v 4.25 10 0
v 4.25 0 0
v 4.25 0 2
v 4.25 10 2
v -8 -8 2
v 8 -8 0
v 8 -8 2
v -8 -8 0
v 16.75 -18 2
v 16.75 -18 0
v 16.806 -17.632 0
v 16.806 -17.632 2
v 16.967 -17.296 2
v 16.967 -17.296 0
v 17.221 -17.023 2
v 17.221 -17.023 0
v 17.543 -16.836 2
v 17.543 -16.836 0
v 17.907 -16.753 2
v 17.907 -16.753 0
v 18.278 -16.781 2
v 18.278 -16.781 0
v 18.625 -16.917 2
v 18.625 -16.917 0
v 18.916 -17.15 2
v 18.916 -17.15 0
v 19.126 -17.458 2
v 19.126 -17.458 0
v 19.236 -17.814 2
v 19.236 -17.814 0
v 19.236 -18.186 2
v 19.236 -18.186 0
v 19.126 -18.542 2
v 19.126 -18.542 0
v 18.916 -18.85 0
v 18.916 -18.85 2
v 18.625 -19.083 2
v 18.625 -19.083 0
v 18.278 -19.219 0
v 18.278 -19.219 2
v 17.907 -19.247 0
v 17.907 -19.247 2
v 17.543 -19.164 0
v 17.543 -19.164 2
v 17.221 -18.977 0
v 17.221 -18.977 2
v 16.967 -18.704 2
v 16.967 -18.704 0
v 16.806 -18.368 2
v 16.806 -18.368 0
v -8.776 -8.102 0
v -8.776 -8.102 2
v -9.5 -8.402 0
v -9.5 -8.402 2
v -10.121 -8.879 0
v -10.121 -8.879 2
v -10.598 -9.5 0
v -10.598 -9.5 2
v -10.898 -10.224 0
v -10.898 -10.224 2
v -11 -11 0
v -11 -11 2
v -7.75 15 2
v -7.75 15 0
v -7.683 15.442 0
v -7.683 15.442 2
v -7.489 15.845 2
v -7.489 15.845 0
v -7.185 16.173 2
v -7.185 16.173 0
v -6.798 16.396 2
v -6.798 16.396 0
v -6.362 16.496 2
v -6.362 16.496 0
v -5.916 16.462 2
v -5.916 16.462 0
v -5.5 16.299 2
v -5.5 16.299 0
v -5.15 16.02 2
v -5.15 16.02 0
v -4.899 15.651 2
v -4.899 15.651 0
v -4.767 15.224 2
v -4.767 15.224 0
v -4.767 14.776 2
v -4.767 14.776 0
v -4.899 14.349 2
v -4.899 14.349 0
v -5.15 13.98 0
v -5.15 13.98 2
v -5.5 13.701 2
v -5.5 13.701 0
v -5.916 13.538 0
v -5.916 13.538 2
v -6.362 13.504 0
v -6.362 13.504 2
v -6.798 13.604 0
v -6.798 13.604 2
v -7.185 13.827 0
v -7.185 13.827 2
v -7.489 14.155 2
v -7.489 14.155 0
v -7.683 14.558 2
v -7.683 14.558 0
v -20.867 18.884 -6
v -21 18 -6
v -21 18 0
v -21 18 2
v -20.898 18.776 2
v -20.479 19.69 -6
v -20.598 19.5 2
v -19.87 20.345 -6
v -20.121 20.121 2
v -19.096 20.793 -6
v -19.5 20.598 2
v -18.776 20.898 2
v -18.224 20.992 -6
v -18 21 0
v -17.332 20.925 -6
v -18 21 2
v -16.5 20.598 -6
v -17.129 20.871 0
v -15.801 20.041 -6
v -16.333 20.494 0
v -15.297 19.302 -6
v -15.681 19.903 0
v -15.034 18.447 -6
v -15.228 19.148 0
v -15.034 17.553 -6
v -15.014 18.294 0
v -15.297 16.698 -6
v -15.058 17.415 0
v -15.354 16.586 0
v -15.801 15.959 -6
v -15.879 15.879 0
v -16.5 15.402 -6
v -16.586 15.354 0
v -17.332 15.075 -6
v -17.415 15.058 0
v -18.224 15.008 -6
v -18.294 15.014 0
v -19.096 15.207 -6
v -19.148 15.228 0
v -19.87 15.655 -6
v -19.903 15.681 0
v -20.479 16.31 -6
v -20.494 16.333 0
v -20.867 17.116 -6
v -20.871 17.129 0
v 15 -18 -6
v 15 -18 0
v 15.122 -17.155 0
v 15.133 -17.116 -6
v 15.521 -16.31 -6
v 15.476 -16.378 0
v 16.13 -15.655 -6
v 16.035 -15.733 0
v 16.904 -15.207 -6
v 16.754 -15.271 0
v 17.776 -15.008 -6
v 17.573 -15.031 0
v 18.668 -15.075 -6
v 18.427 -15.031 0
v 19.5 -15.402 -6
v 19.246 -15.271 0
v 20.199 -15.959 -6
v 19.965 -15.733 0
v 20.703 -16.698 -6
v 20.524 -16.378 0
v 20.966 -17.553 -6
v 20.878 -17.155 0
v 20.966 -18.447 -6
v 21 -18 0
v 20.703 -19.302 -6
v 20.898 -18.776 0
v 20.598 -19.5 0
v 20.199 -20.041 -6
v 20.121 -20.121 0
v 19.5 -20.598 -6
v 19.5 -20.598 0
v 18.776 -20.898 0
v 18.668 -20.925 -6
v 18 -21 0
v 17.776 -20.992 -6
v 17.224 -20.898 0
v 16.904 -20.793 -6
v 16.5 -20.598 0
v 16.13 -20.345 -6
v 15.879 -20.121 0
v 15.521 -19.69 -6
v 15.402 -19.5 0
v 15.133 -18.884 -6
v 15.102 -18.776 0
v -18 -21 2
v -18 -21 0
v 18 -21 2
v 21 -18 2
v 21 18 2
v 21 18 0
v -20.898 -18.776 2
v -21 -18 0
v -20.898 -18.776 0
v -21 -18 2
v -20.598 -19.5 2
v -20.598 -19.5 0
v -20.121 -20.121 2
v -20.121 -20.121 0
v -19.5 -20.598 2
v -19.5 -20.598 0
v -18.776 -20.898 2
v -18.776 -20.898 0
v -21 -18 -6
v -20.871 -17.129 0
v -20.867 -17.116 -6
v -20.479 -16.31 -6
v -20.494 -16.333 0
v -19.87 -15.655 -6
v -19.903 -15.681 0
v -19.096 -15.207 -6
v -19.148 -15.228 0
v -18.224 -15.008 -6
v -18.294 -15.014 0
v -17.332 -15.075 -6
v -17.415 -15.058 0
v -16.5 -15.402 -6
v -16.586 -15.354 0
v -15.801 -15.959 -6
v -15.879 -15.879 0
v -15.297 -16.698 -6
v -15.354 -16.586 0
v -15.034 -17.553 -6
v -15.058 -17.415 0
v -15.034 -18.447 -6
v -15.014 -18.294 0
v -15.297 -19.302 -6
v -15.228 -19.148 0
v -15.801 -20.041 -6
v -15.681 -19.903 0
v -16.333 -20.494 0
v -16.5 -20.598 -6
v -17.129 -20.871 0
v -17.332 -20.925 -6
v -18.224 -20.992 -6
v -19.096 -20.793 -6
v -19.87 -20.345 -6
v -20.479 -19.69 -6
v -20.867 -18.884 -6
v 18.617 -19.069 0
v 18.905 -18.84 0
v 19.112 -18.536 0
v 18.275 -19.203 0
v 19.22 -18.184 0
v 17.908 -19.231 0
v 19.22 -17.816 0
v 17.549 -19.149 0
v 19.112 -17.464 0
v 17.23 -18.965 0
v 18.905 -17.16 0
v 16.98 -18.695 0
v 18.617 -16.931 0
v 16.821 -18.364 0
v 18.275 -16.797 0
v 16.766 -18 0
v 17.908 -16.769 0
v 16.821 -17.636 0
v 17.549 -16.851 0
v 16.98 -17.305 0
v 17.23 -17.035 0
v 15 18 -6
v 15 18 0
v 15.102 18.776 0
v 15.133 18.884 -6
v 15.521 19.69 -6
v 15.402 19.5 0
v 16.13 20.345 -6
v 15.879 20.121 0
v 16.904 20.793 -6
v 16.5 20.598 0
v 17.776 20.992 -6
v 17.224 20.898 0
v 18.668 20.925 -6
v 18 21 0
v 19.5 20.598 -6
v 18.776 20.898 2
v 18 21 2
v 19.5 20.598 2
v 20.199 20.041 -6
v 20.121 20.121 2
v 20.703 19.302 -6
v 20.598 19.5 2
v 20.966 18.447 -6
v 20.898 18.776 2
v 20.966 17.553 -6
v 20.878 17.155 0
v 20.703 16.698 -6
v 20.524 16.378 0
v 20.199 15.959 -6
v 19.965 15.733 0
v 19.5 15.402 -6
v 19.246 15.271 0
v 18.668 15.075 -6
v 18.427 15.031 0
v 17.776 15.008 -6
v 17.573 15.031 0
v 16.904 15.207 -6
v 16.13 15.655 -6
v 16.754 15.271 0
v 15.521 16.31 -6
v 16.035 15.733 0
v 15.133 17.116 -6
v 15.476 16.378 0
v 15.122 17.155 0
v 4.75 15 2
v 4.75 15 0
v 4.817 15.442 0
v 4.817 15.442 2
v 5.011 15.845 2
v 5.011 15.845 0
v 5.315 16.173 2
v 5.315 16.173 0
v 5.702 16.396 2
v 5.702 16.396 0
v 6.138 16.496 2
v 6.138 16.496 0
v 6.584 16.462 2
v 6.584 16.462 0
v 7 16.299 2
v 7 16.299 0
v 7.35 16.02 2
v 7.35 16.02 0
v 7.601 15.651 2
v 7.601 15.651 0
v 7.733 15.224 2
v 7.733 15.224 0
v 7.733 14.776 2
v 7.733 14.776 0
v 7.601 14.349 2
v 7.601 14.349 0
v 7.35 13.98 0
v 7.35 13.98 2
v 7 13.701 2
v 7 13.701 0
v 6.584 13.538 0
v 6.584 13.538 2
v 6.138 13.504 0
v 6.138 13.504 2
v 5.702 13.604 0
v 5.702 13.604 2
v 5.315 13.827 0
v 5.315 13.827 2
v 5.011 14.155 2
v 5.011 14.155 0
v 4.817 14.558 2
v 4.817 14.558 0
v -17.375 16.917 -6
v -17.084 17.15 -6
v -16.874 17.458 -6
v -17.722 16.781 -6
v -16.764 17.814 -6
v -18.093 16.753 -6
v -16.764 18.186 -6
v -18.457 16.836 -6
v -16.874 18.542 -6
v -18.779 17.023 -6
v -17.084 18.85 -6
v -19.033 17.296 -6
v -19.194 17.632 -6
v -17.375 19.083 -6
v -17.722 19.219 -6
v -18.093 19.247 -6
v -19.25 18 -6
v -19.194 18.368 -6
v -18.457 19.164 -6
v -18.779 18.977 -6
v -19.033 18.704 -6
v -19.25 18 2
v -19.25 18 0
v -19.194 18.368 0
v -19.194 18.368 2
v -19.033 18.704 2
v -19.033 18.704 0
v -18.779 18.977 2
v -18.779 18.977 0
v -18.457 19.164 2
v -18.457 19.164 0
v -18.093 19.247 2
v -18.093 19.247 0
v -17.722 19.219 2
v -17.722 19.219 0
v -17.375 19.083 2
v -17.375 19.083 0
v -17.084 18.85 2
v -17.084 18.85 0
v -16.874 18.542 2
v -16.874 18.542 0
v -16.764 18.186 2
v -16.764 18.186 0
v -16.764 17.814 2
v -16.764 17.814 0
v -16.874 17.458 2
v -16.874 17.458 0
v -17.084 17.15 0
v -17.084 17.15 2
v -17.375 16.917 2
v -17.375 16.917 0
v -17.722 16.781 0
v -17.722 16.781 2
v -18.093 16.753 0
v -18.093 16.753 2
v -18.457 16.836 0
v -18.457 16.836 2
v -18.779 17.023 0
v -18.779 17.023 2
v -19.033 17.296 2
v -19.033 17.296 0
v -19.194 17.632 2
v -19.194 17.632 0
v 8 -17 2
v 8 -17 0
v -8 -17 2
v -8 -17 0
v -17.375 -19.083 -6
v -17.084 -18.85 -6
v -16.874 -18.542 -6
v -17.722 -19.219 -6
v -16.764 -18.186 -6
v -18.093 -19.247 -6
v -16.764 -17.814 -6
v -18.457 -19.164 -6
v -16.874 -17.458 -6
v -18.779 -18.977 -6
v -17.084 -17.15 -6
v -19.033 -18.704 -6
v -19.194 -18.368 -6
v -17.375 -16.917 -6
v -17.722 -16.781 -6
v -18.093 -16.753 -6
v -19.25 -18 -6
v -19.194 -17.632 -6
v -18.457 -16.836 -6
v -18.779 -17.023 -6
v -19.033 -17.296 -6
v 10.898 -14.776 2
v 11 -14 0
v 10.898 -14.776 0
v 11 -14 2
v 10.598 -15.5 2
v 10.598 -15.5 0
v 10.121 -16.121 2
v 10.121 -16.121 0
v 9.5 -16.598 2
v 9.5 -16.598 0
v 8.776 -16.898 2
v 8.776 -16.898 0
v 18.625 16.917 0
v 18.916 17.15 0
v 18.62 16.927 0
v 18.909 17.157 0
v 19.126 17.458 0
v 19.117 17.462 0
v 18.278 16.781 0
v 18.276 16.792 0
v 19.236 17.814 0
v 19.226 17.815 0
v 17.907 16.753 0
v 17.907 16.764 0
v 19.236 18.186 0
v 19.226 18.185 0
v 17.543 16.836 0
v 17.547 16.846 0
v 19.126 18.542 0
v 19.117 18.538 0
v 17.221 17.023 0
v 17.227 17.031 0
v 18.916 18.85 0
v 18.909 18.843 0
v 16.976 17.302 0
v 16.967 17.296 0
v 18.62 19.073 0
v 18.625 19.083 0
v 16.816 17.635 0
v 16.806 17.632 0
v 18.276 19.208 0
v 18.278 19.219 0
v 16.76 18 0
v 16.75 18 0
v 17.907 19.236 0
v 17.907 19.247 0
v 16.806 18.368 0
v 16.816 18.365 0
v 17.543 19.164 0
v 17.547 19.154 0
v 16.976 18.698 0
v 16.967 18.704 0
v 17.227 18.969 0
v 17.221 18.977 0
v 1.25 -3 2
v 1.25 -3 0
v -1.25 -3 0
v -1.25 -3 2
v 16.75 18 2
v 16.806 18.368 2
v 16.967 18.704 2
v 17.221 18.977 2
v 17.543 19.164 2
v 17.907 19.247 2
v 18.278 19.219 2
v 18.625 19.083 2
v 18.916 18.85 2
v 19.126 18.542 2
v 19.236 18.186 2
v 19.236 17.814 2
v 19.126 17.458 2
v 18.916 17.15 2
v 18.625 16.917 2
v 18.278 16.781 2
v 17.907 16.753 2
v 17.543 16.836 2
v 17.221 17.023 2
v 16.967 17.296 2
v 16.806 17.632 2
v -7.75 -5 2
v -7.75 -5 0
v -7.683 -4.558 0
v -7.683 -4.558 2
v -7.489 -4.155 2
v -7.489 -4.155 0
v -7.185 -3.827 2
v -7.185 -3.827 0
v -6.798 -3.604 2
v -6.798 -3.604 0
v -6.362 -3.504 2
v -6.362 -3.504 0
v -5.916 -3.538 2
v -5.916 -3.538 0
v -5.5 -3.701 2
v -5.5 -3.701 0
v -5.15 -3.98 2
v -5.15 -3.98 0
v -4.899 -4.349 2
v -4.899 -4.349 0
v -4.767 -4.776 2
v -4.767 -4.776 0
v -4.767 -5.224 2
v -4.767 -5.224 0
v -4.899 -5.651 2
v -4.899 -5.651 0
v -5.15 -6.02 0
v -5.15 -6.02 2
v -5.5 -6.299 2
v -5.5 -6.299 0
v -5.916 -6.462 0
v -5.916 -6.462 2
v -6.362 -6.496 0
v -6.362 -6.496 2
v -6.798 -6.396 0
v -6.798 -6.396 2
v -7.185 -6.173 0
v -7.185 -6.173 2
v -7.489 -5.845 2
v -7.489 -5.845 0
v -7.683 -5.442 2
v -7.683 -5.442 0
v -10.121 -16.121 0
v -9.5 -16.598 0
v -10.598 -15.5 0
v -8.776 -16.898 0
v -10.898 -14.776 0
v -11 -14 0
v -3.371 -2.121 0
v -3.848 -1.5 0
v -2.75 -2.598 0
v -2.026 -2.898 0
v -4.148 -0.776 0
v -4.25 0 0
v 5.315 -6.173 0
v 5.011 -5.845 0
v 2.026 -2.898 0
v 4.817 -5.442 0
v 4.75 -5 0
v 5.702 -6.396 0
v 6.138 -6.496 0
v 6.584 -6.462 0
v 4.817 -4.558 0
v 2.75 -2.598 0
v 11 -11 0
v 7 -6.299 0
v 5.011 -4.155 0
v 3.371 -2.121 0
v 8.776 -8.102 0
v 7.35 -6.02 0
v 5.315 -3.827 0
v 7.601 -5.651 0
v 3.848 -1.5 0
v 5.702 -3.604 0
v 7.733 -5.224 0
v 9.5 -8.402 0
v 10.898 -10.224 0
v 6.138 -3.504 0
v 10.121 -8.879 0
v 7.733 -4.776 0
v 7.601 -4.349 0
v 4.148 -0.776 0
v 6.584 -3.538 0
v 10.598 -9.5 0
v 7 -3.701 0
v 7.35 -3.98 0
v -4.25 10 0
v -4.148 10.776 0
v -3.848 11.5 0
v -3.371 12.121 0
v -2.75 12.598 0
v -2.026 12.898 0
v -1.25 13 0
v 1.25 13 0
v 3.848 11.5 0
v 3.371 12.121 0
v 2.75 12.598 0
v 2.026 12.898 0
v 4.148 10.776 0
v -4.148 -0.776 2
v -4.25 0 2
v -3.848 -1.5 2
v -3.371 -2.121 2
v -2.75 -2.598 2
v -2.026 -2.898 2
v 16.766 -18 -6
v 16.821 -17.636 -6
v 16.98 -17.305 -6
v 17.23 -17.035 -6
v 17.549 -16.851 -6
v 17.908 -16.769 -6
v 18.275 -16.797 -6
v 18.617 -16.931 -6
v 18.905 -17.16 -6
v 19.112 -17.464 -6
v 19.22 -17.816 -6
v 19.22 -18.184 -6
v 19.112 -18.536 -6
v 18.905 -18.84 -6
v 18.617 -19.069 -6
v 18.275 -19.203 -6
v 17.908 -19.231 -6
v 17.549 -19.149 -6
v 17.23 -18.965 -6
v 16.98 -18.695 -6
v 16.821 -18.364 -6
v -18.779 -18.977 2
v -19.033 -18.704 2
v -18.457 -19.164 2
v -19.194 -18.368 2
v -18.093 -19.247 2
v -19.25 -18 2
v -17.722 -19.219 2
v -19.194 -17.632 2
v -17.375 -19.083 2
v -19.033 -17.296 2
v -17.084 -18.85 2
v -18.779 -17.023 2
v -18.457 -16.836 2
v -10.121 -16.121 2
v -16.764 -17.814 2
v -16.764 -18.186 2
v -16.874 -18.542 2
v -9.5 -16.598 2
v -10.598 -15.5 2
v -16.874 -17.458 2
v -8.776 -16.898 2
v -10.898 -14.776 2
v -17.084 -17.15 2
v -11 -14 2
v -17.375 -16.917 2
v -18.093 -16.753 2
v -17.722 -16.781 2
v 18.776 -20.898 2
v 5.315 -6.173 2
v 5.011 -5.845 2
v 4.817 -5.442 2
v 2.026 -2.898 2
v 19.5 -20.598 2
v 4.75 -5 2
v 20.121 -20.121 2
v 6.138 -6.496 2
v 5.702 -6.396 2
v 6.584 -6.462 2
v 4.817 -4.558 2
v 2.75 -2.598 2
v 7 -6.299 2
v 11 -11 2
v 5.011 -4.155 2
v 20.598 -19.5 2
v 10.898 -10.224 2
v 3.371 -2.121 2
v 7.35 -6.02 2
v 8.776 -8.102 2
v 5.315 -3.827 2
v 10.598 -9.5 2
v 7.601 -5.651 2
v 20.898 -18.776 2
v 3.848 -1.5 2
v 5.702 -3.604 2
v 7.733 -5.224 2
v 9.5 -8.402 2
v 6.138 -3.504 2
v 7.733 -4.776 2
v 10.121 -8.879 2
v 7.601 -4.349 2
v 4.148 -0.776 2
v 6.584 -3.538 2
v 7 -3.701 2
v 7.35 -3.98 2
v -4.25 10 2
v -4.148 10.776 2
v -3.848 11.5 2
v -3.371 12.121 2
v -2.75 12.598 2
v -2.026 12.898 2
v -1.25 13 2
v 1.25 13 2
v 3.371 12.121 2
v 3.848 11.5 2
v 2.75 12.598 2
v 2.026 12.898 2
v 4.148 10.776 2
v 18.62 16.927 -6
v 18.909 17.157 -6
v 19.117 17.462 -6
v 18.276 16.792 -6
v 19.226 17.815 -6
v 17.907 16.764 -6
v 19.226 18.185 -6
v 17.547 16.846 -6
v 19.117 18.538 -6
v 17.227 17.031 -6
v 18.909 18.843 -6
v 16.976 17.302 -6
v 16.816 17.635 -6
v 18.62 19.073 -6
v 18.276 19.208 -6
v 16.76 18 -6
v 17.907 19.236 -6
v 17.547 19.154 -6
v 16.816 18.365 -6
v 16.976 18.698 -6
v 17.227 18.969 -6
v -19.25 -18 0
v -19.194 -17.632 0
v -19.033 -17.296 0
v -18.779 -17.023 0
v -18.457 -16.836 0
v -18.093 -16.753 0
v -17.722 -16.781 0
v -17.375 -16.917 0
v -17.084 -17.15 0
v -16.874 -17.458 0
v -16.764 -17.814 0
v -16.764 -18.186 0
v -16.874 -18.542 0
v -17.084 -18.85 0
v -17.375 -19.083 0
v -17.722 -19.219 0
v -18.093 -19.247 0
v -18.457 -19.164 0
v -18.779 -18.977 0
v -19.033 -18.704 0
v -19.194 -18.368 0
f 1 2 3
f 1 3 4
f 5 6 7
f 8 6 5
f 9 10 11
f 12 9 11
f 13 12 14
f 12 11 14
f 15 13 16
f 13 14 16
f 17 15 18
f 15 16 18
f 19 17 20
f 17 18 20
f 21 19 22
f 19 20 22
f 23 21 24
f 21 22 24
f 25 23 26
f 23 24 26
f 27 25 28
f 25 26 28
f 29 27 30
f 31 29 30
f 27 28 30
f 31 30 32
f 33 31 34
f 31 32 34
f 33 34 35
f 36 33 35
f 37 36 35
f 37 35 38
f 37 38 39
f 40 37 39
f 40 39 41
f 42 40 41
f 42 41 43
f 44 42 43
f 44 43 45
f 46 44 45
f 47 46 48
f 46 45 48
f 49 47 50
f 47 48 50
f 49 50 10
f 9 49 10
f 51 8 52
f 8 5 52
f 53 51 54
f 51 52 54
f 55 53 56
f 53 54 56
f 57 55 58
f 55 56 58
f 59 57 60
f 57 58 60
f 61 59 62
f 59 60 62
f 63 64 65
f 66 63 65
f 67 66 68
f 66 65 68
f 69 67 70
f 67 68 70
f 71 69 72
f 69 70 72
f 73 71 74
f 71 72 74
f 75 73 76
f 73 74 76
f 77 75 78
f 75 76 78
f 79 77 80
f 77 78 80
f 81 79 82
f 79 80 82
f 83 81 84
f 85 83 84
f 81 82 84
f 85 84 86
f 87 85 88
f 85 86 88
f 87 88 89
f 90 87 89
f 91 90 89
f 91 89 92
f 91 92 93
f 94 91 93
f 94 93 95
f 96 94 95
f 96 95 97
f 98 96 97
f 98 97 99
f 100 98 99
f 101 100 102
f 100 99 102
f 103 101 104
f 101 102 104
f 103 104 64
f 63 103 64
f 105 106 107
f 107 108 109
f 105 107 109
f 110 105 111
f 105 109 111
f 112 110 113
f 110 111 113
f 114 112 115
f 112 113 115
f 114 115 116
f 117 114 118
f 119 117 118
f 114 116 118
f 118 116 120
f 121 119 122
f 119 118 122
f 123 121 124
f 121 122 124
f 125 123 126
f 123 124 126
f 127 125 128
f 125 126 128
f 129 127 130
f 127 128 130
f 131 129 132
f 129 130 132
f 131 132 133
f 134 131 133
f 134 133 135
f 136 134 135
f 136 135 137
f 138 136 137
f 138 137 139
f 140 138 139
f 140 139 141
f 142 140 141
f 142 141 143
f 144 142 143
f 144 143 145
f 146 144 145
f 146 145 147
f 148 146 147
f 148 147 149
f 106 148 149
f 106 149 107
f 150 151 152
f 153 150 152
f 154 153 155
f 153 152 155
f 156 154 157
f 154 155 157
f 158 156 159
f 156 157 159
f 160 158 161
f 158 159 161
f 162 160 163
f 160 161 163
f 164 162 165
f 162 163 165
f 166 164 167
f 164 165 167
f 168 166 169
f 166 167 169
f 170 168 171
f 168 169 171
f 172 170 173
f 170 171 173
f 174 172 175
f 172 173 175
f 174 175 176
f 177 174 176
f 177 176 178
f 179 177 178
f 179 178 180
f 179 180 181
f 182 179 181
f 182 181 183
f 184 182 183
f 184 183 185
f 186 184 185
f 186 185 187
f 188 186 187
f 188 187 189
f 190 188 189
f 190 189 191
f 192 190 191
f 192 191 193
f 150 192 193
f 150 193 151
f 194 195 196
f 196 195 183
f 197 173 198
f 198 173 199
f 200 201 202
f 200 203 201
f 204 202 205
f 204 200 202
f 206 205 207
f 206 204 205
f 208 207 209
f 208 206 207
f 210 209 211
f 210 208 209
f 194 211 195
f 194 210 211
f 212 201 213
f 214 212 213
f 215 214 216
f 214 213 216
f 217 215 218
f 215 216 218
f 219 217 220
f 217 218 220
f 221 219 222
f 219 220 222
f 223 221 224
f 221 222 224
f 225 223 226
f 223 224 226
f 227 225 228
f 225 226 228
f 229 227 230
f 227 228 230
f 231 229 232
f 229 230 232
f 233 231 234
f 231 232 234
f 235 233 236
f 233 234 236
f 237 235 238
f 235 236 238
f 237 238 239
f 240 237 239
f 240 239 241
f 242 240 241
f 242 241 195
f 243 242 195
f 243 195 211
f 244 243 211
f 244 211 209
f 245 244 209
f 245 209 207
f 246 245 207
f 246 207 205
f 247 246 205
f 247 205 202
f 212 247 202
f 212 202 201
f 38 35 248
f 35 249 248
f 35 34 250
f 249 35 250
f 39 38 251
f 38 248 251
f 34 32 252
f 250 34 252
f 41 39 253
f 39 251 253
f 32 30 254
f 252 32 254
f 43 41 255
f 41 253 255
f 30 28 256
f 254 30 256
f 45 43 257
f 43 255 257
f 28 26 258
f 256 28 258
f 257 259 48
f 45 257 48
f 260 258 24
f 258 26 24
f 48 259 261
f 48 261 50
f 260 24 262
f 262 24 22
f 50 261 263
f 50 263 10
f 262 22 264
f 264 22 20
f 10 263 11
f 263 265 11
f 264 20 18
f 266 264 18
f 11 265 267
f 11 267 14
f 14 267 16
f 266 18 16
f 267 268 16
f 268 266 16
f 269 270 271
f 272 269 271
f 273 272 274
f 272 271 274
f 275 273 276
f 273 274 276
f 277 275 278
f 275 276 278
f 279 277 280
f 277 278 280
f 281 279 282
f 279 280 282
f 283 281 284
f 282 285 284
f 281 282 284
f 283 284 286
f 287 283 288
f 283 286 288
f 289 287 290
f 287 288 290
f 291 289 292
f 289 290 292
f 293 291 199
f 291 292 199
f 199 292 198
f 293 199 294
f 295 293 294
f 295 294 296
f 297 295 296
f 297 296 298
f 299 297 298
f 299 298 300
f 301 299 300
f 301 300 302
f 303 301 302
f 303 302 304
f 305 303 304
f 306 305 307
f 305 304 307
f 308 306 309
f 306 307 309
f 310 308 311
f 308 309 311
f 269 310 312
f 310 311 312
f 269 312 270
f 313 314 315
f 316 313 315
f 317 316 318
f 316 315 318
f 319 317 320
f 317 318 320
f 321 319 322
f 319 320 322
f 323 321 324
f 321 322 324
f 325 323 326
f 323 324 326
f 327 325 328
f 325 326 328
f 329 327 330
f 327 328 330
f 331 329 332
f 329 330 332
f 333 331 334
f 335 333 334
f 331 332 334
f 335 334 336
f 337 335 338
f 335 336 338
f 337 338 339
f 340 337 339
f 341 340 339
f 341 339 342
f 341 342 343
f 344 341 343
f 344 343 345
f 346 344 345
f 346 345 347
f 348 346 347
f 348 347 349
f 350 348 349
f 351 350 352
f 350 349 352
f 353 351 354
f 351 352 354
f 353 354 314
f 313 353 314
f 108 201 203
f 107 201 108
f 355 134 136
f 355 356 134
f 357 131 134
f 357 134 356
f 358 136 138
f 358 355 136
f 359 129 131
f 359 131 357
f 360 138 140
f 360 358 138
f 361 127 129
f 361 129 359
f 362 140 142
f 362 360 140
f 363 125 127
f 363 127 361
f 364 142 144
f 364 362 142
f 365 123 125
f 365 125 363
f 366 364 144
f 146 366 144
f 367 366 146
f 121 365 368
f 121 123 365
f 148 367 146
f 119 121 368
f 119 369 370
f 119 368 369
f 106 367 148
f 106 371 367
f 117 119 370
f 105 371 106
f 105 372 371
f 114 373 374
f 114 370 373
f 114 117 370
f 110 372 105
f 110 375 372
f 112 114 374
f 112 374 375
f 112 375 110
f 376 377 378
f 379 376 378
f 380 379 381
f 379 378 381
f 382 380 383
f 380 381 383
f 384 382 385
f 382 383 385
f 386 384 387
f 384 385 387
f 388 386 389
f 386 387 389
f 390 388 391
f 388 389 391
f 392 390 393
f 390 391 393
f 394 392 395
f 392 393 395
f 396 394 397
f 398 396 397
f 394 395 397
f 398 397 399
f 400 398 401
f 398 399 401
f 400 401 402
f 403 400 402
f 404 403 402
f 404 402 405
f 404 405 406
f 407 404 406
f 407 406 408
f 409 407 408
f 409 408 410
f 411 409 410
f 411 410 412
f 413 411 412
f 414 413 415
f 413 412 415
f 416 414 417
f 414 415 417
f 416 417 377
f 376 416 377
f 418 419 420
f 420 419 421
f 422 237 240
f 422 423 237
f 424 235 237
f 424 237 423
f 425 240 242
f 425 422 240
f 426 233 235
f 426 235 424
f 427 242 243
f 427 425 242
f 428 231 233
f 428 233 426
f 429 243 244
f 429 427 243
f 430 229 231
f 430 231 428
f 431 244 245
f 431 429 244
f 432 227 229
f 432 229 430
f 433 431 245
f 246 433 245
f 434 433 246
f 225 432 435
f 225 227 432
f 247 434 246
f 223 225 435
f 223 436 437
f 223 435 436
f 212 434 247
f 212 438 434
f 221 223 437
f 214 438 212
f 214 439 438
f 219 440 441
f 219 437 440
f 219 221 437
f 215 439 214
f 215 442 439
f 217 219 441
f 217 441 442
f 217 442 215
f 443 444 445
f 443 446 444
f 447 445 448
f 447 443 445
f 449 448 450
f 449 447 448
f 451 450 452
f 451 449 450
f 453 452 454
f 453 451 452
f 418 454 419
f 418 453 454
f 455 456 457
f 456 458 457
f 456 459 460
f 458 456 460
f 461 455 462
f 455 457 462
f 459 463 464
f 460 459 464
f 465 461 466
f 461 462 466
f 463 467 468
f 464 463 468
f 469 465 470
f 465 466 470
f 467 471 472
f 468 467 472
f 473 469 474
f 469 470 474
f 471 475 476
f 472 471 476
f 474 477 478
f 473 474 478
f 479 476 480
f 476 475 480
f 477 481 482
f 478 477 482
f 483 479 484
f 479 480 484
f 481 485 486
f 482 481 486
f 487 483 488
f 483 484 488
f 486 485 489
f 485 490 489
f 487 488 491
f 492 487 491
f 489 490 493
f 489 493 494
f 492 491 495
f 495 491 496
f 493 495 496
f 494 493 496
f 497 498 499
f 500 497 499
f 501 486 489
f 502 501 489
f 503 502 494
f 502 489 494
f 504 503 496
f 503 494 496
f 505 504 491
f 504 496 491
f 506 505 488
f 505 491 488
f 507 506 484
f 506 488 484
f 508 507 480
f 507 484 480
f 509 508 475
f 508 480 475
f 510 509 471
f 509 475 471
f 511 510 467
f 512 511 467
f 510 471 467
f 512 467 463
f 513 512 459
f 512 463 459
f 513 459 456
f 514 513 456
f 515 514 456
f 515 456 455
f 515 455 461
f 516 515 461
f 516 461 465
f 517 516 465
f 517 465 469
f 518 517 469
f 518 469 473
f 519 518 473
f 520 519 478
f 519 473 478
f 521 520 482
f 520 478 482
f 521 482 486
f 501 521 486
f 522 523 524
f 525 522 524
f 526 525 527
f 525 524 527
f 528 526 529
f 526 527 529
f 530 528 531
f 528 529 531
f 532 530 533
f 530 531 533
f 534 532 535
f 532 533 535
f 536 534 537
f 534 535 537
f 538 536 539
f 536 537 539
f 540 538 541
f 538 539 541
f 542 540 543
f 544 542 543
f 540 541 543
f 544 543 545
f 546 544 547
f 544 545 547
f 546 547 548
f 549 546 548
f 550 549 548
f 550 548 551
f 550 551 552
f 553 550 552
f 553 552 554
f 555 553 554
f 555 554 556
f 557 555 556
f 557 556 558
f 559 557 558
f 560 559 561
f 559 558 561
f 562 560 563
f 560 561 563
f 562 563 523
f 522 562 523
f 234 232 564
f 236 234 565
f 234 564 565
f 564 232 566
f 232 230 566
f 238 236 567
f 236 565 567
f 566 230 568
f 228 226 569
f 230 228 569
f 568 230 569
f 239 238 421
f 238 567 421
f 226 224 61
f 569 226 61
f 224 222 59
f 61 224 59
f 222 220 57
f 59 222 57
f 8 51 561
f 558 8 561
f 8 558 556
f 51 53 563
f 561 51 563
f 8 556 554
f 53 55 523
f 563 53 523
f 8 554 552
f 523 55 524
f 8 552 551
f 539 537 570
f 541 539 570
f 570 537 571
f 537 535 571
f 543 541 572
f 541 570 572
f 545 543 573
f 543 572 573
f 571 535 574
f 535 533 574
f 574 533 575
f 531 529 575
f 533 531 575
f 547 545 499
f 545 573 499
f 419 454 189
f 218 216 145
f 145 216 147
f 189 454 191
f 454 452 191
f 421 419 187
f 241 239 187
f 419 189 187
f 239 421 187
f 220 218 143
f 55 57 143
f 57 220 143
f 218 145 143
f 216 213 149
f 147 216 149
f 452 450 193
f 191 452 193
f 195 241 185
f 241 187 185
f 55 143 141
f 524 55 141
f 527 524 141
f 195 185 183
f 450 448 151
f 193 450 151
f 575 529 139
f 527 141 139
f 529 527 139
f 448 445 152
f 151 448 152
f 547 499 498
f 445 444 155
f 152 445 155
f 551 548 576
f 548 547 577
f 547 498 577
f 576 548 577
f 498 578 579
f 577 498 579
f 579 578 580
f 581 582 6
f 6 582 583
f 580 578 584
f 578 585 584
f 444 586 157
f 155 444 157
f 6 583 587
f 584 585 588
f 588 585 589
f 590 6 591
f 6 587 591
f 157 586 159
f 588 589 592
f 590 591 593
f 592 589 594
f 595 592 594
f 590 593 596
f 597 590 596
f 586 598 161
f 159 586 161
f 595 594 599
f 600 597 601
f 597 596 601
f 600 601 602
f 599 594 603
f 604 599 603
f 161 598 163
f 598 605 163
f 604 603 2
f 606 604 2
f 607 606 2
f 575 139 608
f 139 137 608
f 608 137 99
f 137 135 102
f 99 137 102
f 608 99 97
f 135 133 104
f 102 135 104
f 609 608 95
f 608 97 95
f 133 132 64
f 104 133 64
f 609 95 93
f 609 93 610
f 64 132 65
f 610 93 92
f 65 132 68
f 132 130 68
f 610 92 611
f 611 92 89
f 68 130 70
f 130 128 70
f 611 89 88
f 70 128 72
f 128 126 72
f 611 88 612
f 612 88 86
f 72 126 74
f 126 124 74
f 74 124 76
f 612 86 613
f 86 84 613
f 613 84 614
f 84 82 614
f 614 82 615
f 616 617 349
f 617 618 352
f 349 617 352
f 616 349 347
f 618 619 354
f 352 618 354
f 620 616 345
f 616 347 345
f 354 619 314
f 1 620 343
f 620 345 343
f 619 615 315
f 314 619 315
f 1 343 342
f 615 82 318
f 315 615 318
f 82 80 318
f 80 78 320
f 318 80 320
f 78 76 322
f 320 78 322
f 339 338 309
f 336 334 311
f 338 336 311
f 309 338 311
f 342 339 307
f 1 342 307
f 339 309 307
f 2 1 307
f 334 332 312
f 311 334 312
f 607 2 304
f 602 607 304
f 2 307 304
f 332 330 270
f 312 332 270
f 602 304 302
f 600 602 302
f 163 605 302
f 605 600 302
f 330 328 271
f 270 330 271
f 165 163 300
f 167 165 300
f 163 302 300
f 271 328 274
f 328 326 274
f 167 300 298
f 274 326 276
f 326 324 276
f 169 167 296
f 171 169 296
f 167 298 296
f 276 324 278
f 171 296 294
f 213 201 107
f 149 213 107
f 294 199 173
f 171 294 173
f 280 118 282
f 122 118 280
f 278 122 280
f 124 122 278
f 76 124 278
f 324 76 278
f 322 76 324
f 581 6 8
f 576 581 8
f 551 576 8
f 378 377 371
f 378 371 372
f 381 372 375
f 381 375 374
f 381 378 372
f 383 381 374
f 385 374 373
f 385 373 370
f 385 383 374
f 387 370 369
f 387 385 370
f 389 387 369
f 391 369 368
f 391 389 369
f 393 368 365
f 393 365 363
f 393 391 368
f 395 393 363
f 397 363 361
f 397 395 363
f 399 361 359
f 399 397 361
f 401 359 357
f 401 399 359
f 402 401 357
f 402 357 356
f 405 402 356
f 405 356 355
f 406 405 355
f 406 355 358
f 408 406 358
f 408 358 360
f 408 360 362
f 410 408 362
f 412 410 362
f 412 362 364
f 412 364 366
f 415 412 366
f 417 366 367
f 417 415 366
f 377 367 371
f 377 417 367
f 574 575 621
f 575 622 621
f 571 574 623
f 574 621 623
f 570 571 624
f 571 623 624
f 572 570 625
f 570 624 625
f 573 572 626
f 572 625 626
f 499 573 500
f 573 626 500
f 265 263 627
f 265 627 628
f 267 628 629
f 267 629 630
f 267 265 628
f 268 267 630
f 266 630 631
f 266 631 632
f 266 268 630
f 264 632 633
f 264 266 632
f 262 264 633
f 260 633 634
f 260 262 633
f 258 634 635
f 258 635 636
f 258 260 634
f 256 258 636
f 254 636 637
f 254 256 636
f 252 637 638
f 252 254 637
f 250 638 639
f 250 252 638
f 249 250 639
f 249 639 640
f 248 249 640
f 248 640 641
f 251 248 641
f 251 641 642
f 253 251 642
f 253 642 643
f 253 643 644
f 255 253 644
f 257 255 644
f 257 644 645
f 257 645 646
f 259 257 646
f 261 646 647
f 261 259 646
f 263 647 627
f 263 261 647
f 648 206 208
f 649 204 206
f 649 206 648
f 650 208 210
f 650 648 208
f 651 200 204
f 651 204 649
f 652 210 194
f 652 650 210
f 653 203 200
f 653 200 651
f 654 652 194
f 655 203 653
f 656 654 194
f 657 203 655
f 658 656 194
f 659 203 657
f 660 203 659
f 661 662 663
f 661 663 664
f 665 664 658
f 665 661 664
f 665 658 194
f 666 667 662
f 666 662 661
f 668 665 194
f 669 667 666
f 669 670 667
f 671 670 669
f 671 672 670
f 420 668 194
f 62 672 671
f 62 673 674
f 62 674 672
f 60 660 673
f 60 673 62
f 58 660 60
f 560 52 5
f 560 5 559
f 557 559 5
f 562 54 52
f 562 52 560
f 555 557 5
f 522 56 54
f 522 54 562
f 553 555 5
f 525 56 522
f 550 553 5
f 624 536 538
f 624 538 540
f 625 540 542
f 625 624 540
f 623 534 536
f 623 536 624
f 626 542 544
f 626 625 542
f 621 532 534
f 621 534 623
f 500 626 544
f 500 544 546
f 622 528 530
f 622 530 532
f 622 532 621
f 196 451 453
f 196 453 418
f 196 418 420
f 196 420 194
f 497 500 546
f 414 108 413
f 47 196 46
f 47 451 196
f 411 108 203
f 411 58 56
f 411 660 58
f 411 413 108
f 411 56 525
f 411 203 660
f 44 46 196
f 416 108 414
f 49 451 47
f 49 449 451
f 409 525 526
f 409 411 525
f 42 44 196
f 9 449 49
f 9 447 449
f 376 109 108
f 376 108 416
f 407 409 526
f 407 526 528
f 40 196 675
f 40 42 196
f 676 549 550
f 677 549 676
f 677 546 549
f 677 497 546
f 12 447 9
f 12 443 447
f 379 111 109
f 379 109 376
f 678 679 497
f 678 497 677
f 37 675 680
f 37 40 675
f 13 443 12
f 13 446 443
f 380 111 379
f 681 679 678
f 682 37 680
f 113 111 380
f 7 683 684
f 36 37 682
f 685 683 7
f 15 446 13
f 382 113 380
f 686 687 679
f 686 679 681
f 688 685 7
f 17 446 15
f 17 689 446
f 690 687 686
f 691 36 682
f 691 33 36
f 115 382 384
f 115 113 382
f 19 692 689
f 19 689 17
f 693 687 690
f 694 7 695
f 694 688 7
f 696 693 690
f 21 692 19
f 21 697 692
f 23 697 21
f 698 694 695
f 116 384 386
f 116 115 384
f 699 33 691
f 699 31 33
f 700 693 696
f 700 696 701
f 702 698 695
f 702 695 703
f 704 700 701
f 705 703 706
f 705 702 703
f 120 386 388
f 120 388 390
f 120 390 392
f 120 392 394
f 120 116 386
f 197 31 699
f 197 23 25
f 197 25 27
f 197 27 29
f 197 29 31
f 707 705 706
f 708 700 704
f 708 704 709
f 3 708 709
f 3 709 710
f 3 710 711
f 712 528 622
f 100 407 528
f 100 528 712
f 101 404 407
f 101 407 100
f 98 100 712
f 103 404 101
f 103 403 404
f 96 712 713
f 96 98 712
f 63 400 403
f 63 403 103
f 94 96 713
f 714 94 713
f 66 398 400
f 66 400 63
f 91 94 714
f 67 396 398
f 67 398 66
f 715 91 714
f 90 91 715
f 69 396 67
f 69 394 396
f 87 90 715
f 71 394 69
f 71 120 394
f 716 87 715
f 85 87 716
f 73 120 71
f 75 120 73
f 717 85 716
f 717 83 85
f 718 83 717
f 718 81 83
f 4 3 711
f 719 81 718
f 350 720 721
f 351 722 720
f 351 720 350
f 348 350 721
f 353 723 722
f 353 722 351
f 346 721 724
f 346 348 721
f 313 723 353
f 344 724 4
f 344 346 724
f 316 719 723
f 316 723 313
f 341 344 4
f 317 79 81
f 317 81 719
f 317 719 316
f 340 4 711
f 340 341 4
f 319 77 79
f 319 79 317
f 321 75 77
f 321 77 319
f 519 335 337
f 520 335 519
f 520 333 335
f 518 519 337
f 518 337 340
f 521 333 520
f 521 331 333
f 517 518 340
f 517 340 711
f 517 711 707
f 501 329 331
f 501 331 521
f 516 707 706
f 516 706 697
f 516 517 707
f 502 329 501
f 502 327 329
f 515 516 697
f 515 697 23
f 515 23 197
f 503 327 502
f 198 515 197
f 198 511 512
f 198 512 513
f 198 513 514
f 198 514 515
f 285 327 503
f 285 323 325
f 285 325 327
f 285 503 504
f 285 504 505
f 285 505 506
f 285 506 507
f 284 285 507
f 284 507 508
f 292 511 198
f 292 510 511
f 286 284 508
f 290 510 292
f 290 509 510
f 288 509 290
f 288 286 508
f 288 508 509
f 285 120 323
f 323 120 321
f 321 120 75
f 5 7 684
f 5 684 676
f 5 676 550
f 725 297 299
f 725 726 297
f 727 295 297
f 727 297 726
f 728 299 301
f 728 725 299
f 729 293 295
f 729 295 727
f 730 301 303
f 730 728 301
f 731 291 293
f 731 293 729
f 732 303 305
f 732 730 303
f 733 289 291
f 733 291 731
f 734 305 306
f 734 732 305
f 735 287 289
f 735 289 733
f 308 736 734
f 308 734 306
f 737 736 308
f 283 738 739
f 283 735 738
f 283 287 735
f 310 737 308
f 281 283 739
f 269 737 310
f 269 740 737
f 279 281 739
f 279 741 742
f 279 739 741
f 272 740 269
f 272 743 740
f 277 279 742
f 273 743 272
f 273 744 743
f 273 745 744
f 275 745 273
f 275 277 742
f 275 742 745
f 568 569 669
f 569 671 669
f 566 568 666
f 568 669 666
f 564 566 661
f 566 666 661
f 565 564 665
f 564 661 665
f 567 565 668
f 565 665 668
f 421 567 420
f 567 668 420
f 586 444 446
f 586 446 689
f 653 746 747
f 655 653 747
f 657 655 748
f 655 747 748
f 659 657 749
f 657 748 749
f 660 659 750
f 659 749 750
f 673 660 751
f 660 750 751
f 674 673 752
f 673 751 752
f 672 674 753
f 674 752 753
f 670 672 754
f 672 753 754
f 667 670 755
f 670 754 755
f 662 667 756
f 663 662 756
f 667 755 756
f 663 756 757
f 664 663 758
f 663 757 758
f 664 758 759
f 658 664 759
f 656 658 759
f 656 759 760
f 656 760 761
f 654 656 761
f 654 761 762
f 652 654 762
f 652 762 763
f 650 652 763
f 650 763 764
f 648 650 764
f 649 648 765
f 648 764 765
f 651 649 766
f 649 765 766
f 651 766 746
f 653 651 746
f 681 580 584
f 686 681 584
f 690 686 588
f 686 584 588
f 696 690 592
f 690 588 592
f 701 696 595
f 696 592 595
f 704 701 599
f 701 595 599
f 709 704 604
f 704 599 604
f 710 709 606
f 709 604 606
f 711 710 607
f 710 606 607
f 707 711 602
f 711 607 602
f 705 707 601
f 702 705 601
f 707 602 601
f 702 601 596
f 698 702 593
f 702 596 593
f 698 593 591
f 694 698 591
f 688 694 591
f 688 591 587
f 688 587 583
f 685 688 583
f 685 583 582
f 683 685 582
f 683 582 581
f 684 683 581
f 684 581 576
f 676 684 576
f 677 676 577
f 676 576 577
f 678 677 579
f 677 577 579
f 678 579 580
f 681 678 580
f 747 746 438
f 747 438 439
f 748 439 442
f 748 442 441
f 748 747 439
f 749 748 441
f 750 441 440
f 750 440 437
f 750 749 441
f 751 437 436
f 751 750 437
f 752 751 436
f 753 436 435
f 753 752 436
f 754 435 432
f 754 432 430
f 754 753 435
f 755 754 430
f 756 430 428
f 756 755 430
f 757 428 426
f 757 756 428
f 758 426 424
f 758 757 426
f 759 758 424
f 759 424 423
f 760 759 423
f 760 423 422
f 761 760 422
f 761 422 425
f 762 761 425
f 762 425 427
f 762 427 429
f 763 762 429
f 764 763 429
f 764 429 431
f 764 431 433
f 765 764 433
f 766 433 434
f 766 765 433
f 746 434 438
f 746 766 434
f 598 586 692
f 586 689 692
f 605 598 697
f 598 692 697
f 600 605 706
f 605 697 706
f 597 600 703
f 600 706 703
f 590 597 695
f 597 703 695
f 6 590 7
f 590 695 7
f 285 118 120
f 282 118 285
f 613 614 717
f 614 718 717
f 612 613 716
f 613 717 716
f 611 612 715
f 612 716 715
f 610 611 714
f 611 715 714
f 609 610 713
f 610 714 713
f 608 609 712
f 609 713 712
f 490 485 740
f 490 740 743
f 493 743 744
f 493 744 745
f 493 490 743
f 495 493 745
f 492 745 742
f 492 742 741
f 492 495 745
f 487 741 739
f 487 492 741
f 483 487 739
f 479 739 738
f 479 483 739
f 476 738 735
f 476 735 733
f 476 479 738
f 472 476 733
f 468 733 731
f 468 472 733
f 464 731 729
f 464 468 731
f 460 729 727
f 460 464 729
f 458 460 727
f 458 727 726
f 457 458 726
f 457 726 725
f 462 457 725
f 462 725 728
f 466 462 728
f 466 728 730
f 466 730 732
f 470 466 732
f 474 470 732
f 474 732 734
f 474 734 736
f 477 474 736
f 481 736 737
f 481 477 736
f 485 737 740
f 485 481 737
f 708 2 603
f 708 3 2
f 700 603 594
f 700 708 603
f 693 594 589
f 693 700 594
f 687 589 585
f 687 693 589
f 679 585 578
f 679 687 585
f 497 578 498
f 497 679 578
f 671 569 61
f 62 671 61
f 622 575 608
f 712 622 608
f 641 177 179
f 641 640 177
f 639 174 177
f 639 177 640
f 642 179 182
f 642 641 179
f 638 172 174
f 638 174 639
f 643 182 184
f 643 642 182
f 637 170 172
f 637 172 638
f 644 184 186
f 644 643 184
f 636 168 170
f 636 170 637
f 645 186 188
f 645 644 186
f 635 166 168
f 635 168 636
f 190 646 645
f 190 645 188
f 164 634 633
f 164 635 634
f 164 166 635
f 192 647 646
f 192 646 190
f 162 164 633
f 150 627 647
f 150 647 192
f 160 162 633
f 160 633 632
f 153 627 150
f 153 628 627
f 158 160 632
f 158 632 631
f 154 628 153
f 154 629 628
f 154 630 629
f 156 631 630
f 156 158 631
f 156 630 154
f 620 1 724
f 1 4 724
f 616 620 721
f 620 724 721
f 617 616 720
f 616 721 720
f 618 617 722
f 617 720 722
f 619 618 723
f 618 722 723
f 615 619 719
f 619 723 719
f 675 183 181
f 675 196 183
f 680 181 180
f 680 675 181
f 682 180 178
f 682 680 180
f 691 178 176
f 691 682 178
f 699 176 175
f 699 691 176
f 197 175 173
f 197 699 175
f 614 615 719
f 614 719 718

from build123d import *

# Parameters (mm, degrees)
SKETCH_1_W          = 42
SKETCH_1_H          = 42
EXTRUDE_1_DEPTH     = 2
SKETCH_2_R          = 1.5
SKETCH_2_R_2        = 1.25
SKETCH_2_W          = 8.5
SKETCH_2_H          = 16
SKETCH_2_W_2        = 22
SKETCH_2_H_2        = 9
CUT_EXTRUDE_1_DEPTH = 2
FILLET_1_R          = 3
SKETCH_3_R          = 3
SKETCH_3_R_2        = 1.25
SKETCH_3_R_3        = 1.234283691
SKETCH_3_R_4        = 1.239522306
EXTRUDE_2_DEPTH     = 6


with BuildPart() as part:
    # 草图1 → 凸台-拉伸1 (new body)
    with BuildSketch(Plane.XY):
        Rectangle(SKETCH_1_W, SKETCH_1_H)
    extrude(amount=EXTRUDE_1_DEPTH)

    # 草图2 → 切除-拉伸1 (cut)
    with BuildSketch(Plane(origin=(0, 0, 0), x_dir=(-1, 0, 0), z_dir=(0, 0, -1))):
        with Locations((-6.25, 15)):
            Circle(SKETCH_2_R)
        with Locations((6.25, 15)):
            Circle(SKETCH_2_R)
        with Locations((6.25, -5)):
            Circle(SKETCH_2_R)
        with Locations((-6.25, -5)):
            Circle(SKETCH_2_R)
        with Locations((18, -18)):
            Circle(SKETCH_2_R_2)
        with Locations((-18, -18)):
            Circle(SKETCH_2_R_2)
        with Locations((-18, 18)):
            Circle(SKETCH_2_R_2)
        with Locations((18, 18)):
            Circle(SKETCH_2_R_2)
        with Locations((0, 5)):
            Rectangle(SKETCH_2_W, SKETCH_2_H)
        with Locations((0, -12.5)):
            Rectangle(SKETCH_2_W_2, SKETCH_2_H_2)
    extrude(amount=-CUT_EXTRUDE_1_DEPTH, mode=Mode.SUBTRACT)

    # 圆角1
    fillet_1_edges = [part.edges().sort_by_distance(p)[0] for p in [
        (-11, -8, 1),
        (-11, -17, 1),
        (11, -17, 1),
        (11, -8, 1),
        (4.25, 13, 1),
        (-4.25, 13, 1),
        (-4.25, -3, 1),
        (4.25, -3, 1),
        (21, -21, 1),
        (-21, -21, 1),
        (-21, 21, 1),
        (21, 21, 1),
    ]]
    fillet(fillet_1_edges, radius=FILLET_1_R)

    # 草图3 → 凸台-拉伸2 (add)
    # profile 1 of 4: a face of its own
    with BuildSketch(Plane(origin=(0, 0, 0), x_dir=(-1, 0, 0), z_dir=(0, 0, -1))):
        with Locations((18, 18)):
            Circle(SKETCH_3_R)
        with Locations((18, 18)):
            Circle(SKETCH_3_R_2, mode=Mode.SUBTRACT)
    # profile 2 of 4: a face of its own
    with BuildSketch(Plane(origin=(0, 0, 0), x_dir=(-1, 0, 0), z_dir=(0, 0, -1))):
        with Locations((18, -18)):
            Circle(SKETCH_3_R)
        with Locations((18, -18)):
            Circle(SKETCH_3_R_2, mode=Mode.SUBTRACT)
    # profile 3 of 4: a face of its own
    with BuildSketch(Plane(origin=(0, 0, 0), x_dir=(-1, 0, 0), z_dir=(0, 0, -1))):
        with Locations((-18, -18)):
            Circle(SKETCH_3_R)
        with Locations((-18, -18)):
            Circle(SKETCH_3_R_3, mode=Mode.SUBTRACT)
    # profile 4 of 4: a face of its own
    with BuildSketch(Plane(origin=(0, 0, 0), x_dir=(-1, 0, 0), z_dir=(0, 0, -1))):
        with Locations((-18, 18)):
            Circle(SKETCH_3_R)
        with Locations((-18, 18)):
            Circle(SKETCH_3_R_4, mode=Mode.SUBTRACT)
    extrude(amount=EXTRUDE_2_DEPTH)


solid = part.part
